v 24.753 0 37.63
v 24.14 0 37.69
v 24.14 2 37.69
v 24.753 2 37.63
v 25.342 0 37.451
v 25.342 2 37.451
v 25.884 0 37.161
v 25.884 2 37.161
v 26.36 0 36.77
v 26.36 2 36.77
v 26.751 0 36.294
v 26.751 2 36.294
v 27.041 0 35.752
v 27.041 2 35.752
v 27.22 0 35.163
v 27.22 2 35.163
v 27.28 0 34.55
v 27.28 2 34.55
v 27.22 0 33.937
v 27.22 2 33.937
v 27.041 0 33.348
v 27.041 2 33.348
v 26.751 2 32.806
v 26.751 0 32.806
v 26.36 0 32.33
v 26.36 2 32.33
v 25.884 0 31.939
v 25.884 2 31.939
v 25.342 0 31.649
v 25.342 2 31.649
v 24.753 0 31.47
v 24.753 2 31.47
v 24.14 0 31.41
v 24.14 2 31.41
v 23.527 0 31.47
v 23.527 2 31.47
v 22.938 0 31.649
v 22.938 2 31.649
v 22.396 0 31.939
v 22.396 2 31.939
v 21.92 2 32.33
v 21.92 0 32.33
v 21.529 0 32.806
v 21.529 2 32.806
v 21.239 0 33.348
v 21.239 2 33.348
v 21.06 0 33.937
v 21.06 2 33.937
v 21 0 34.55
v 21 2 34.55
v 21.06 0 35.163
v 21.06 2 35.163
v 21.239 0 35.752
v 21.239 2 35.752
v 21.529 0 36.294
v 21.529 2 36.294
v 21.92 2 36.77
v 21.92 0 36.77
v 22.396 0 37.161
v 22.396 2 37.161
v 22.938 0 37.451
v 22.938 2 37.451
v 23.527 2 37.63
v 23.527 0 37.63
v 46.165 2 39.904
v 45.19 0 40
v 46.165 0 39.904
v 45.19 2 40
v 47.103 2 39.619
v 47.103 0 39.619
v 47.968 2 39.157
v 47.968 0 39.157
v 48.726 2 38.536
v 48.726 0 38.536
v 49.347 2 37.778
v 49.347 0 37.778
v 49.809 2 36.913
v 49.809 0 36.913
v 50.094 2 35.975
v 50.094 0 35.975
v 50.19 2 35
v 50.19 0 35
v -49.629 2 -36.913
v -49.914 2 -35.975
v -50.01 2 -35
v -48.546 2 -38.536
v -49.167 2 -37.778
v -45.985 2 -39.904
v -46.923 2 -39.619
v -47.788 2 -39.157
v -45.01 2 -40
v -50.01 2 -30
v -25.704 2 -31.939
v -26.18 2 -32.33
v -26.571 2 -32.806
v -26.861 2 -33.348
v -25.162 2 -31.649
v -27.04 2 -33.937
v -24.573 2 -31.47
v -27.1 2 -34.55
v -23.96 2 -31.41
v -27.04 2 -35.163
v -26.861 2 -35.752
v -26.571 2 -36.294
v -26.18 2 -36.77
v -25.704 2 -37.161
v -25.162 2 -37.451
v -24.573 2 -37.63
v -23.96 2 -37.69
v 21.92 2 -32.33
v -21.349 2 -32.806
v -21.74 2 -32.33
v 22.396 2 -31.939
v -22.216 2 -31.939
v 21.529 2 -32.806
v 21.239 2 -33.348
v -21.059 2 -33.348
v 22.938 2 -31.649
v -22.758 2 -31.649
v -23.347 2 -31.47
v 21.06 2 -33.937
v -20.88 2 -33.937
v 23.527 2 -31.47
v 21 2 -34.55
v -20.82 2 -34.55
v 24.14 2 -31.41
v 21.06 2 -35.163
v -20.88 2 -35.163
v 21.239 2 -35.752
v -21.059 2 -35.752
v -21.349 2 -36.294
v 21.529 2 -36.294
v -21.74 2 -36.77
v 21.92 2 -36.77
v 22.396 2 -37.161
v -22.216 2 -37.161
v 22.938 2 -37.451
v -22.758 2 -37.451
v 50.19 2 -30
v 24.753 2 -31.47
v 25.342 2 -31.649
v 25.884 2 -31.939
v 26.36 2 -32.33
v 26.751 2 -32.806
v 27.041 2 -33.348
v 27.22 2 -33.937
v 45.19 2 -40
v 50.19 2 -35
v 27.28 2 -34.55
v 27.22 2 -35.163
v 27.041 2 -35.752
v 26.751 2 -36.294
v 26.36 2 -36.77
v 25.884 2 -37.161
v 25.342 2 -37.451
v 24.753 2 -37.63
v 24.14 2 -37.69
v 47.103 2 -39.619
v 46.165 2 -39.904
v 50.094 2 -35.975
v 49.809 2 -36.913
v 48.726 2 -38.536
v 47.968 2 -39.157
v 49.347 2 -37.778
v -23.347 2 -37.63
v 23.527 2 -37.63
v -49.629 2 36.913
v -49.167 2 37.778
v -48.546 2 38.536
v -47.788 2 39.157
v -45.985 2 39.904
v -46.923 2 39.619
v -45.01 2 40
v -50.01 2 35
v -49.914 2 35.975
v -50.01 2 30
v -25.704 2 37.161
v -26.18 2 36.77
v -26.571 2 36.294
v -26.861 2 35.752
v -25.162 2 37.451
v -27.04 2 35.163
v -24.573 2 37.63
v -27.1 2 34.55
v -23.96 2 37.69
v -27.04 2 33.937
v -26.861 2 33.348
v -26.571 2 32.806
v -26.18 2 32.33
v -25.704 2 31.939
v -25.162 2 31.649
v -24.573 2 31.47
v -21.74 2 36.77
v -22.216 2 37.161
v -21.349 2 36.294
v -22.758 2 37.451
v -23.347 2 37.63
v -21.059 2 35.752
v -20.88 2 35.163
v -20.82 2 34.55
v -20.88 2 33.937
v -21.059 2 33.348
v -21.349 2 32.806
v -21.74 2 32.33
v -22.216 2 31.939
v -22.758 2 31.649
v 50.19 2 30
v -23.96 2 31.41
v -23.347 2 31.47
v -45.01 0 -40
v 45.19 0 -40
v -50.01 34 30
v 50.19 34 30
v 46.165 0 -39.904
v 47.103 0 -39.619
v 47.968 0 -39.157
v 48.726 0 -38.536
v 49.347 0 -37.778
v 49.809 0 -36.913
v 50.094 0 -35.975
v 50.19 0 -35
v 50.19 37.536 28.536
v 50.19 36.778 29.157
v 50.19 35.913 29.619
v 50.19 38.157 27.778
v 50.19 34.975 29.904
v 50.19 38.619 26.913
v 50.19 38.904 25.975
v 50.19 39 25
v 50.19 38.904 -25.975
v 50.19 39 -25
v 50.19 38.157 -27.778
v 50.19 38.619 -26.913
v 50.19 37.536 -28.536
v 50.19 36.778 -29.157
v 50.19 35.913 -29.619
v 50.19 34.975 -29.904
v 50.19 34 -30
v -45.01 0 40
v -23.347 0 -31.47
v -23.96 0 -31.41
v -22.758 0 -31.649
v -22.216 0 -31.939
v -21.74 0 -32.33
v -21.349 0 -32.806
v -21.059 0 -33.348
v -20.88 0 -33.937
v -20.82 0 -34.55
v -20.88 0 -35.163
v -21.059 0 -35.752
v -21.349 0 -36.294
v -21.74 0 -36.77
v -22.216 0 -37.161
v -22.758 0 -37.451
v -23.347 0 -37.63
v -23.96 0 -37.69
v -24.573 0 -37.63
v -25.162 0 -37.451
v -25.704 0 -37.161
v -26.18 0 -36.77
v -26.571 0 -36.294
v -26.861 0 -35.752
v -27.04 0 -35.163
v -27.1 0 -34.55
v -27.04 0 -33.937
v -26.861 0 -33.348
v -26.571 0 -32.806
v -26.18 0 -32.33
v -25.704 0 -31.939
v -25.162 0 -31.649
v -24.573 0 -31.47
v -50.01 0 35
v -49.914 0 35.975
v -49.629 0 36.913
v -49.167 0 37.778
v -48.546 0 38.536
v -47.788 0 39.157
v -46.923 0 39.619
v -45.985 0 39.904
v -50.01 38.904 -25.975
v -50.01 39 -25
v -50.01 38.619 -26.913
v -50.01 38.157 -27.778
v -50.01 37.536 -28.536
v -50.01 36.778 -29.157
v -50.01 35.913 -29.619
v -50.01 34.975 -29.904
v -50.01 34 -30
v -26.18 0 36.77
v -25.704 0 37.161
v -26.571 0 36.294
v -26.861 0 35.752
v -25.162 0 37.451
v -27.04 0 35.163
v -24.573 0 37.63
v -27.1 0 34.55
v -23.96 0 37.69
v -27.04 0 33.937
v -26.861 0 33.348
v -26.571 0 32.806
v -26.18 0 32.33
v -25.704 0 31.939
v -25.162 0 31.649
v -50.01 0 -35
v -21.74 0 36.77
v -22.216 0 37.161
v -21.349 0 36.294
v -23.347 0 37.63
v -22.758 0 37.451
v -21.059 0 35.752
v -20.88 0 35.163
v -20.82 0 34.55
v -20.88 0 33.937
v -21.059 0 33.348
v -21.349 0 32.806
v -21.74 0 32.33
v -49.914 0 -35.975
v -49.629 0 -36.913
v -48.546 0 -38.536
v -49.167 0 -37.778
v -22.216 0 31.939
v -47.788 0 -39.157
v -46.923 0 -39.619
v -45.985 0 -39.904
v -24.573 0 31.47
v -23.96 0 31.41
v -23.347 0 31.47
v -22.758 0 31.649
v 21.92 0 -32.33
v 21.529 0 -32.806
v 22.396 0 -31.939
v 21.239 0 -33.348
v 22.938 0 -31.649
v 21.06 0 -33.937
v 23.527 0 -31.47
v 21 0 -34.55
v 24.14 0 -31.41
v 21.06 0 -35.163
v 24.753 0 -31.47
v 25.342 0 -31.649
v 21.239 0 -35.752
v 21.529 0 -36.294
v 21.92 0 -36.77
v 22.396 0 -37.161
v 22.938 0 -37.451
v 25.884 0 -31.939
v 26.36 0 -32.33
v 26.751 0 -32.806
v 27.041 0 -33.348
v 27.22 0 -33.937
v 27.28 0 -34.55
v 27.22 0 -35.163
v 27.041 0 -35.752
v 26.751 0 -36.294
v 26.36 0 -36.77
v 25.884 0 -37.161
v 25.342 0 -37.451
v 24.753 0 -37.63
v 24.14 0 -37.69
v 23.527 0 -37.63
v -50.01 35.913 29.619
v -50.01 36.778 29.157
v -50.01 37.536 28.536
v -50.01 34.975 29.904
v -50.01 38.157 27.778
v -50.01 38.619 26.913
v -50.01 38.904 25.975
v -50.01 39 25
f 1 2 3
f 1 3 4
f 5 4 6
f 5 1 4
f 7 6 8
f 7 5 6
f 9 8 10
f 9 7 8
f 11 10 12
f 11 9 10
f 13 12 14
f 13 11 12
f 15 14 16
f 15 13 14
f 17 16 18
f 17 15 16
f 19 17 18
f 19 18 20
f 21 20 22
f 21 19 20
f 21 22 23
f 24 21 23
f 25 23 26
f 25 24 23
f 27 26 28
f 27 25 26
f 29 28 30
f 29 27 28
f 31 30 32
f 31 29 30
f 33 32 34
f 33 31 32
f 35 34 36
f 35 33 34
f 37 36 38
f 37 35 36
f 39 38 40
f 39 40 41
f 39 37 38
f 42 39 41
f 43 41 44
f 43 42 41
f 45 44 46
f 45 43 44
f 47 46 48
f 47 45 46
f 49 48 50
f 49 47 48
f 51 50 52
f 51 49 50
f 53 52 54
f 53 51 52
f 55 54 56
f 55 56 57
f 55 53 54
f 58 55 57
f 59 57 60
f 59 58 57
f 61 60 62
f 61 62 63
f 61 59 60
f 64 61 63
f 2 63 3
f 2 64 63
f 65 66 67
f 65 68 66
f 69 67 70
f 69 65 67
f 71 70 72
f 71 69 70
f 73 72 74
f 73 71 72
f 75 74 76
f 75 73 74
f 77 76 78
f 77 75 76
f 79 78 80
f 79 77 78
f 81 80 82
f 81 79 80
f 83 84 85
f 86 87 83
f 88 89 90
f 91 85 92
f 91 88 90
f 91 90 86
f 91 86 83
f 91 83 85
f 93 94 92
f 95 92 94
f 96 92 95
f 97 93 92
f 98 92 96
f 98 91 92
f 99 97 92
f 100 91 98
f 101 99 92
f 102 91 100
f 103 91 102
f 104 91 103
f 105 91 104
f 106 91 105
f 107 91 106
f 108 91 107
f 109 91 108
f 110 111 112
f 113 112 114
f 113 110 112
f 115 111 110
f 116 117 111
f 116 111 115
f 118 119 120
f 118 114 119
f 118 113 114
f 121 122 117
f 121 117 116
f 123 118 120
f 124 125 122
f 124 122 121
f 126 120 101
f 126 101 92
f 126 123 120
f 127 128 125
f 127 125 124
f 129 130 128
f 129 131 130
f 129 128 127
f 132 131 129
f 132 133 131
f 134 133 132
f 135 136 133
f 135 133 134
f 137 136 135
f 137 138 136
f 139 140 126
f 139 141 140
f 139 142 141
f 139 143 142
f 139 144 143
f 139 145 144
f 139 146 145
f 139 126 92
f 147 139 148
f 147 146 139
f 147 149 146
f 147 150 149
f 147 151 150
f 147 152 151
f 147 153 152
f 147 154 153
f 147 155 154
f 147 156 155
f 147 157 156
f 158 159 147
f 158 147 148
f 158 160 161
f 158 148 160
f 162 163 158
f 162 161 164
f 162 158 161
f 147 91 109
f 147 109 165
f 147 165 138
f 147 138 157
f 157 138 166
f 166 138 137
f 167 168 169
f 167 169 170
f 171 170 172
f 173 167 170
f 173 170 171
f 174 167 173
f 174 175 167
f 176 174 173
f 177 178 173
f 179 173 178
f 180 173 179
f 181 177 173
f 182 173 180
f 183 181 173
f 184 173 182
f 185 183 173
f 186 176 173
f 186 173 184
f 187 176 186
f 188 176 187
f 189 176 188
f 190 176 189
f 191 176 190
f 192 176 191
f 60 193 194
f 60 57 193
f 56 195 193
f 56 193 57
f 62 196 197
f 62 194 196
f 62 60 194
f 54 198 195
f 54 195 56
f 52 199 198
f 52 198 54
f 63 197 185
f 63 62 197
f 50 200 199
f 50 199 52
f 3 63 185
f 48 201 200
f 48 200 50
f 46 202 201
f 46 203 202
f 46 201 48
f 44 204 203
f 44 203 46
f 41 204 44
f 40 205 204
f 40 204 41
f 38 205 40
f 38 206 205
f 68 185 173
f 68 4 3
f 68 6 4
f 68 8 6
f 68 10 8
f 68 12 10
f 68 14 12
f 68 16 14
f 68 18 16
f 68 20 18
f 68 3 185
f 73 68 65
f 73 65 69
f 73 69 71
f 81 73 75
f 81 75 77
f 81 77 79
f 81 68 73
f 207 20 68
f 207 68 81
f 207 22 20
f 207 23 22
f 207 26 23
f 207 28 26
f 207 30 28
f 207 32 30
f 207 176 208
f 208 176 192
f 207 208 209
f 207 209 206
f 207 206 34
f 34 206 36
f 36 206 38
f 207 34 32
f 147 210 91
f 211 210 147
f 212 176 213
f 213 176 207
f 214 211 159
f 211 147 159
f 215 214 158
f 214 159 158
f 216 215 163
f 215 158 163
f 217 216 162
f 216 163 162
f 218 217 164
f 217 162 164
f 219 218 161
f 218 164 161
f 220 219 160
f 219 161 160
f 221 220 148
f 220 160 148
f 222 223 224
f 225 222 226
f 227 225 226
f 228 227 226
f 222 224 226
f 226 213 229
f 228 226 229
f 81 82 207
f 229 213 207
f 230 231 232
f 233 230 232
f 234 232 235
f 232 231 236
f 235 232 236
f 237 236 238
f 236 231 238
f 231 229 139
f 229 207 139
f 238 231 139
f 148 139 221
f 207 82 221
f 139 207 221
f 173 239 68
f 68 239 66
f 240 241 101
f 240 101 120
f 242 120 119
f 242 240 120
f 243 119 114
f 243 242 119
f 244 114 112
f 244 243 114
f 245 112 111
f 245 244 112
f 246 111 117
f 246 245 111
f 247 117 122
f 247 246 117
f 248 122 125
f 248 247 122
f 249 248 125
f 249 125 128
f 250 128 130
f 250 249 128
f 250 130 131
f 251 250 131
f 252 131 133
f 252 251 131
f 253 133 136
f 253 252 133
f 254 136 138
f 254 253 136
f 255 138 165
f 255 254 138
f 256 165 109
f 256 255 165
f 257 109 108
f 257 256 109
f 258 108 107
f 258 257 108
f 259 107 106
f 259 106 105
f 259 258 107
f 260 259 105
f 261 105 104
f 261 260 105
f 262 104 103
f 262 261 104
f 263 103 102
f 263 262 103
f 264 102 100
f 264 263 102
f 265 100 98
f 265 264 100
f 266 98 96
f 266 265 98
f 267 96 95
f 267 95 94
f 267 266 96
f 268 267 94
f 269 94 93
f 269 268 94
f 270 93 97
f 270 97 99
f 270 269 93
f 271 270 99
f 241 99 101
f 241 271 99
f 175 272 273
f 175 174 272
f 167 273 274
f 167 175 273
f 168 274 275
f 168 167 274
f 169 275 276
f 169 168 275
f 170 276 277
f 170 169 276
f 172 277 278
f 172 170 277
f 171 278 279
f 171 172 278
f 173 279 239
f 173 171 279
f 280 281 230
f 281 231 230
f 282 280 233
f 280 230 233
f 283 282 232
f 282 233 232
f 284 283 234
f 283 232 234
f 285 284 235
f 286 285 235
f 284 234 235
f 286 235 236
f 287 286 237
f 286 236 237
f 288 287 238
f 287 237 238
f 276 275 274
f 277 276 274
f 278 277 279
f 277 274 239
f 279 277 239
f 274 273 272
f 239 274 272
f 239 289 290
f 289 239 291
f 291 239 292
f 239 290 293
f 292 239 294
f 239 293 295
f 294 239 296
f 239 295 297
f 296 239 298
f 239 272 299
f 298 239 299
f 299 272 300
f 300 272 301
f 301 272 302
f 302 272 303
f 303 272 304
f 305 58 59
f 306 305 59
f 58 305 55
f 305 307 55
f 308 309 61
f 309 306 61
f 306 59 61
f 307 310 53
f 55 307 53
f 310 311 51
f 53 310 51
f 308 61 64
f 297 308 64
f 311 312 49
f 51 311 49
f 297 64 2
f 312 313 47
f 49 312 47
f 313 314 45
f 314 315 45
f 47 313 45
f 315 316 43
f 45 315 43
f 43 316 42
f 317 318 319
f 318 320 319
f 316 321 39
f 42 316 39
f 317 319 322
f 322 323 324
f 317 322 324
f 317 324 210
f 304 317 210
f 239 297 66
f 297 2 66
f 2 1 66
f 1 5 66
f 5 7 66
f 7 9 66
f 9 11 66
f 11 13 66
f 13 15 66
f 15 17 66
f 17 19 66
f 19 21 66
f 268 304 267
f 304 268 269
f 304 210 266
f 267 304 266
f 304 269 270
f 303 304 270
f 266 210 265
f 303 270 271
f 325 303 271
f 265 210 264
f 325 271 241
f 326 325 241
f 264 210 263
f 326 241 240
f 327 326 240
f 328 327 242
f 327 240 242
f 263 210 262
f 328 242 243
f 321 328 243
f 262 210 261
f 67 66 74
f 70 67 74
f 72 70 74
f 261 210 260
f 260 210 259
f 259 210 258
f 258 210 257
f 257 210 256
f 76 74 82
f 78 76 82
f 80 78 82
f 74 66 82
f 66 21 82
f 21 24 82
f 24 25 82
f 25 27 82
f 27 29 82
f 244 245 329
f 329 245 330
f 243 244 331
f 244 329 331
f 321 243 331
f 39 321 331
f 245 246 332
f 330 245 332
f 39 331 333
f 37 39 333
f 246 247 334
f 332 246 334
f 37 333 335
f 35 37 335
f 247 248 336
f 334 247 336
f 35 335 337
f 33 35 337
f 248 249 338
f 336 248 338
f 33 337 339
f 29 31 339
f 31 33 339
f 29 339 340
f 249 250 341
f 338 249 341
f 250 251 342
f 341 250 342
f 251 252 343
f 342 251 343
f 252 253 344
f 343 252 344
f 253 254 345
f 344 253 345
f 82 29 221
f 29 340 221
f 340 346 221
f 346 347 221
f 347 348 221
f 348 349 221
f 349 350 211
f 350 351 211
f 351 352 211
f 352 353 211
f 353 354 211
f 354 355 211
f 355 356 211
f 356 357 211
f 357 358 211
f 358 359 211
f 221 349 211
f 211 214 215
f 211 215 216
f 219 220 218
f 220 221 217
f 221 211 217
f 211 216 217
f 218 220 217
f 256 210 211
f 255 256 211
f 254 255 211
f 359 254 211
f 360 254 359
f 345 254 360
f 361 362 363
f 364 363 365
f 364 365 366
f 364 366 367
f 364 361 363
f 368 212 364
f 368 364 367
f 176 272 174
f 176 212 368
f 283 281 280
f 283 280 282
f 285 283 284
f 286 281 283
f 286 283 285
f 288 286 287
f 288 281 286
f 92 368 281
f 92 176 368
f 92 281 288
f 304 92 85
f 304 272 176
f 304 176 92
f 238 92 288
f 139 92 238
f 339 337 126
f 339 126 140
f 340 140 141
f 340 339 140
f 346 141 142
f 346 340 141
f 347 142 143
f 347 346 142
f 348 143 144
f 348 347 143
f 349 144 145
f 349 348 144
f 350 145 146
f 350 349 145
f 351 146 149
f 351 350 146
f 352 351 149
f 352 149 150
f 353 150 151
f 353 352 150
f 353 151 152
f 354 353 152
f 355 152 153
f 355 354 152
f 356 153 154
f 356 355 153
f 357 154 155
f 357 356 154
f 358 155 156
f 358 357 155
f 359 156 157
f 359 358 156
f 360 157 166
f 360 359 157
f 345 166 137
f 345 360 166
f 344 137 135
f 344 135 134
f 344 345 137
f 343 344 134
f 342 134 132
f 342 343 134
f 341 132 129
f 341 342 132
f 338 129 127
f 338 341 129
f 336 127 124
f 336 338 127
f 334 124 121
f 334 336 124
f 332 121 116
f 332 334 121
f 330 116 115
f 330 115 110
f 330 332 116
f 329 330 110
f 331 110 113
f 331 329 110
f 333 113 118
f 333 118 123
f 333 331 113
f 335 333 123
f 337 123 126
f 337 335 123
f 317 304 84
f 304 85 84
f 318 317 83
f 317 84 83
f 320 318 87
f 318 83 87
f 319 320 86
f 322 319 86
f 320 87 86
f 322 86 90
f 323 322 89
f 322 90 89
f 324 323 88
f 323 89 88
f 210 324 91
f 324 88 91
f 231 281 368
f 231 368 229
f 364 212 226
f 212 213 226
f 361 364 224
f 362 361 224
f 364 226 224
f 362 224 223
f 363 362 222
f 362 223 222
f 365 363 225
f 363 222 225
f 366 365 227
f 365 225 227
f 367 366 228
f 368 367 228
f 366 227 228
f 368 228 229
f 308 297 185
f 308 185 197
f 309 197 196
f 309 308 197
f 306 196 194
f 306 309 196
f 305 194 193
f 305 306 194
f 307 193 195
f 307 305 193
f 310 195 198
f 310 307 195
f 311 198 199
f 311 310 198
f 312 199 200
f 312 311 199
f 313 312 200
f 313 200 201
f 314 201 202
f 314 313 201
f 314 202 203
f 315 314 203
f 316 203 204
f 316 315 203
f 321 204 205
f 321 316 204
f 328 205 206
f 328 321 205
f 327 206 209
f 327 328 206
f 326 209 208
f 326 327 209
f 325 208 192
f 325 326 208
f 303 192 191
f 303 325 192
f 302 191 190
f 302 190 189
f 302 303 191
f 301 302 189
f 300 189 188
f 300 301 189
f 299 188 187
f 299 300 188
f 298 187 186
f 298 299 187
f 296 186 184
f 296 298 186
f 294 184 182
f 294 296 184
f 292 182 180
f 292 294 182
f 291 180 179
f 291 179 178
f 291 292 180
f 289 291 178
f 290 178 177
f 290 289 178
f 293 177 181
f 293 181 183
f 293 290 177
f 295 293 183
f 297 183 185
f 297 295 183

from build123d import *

# Parameters (mm, degrees)
SKETCH_1_W      = 100.2
SKETCH_1_H      = 80
SKETCH_1_R      = 3.14
EXTRUDE_1_DEPTH = 2
SKETCH_3_W      = 100.2
SKETCH_3_H      = 60
EXTRUDE_2_DEPTH = 37
FILLET_1_R      = 5
FILLET_2_R      = 5


with BuildPart() as part:
    # 草图1 → 凸台-拉伸1 (new body)
    with BuildSketch(Plane(origin=(0, 0, 0), x_dir=(1, 0, 0), z_dir=(0, 1, 0))):
        with Locations((0.09, 0)):
            Rectangle(SKETCH_1_W, SKETCH_1_H)
        with Locations(Location((-23.96, 34.55, 0), (0, 0, 270))):
            Circle(SKETCH_1_R, mode=Mode.SUBTRACT)
        with Locations(Location((24.14, 34.55, 0), (0, 0, 270))):
            Circle(SKETCH_1_R, mode=Mode.SUBTRACT)
        with Locations(Location((24.14, -34.55, 0), (0, 0, 270))):
            Circle(SKETCH_1_R, mode=Mode.SUBTRACT)
        with Locations(Location((-23.96, -34.55, 0), (0, 0, 270))):
            Circle(SKETCH_1_R, mode=Mode.SUBTRACT)
    extrude(amount=EXTRUDE_1_DEPTH)

    # 草图3 → 凸台-拉伸2 (add)
    with BuildSketch(Plane(origin=(0, 2, 0), x_dir=(1, 0, 0), z_dir=(0, 1, 0))):
        with Locations((0.09, 0)):
            Rectangle(SKETCH_3_W, SKETCH_3_H)
    extrude(amount=EXTRUDE_2_DEPTH)

    # 圆角1
    fillet_1_edges = [part.edges().sort_by_distance(p)[0] for p in [
        (-50.01, 1, -40),
        (50.19, 1, -40),
        (50.19, 1, 40),
        (-50.01, 1, 40),
    ]]
    fillet(fillet_1_edges, radius=FILLET_1_R)

    # 圆角2
    fillet_2_edges = [part.edges().sort_by_distance(p)[0] for p in [
        (0.09, 39, 30),
        (0.09, 39, -30),
    ]]
    fillet(fillet_2_edges, radius=FILLET_2_R)


solid = part.part
